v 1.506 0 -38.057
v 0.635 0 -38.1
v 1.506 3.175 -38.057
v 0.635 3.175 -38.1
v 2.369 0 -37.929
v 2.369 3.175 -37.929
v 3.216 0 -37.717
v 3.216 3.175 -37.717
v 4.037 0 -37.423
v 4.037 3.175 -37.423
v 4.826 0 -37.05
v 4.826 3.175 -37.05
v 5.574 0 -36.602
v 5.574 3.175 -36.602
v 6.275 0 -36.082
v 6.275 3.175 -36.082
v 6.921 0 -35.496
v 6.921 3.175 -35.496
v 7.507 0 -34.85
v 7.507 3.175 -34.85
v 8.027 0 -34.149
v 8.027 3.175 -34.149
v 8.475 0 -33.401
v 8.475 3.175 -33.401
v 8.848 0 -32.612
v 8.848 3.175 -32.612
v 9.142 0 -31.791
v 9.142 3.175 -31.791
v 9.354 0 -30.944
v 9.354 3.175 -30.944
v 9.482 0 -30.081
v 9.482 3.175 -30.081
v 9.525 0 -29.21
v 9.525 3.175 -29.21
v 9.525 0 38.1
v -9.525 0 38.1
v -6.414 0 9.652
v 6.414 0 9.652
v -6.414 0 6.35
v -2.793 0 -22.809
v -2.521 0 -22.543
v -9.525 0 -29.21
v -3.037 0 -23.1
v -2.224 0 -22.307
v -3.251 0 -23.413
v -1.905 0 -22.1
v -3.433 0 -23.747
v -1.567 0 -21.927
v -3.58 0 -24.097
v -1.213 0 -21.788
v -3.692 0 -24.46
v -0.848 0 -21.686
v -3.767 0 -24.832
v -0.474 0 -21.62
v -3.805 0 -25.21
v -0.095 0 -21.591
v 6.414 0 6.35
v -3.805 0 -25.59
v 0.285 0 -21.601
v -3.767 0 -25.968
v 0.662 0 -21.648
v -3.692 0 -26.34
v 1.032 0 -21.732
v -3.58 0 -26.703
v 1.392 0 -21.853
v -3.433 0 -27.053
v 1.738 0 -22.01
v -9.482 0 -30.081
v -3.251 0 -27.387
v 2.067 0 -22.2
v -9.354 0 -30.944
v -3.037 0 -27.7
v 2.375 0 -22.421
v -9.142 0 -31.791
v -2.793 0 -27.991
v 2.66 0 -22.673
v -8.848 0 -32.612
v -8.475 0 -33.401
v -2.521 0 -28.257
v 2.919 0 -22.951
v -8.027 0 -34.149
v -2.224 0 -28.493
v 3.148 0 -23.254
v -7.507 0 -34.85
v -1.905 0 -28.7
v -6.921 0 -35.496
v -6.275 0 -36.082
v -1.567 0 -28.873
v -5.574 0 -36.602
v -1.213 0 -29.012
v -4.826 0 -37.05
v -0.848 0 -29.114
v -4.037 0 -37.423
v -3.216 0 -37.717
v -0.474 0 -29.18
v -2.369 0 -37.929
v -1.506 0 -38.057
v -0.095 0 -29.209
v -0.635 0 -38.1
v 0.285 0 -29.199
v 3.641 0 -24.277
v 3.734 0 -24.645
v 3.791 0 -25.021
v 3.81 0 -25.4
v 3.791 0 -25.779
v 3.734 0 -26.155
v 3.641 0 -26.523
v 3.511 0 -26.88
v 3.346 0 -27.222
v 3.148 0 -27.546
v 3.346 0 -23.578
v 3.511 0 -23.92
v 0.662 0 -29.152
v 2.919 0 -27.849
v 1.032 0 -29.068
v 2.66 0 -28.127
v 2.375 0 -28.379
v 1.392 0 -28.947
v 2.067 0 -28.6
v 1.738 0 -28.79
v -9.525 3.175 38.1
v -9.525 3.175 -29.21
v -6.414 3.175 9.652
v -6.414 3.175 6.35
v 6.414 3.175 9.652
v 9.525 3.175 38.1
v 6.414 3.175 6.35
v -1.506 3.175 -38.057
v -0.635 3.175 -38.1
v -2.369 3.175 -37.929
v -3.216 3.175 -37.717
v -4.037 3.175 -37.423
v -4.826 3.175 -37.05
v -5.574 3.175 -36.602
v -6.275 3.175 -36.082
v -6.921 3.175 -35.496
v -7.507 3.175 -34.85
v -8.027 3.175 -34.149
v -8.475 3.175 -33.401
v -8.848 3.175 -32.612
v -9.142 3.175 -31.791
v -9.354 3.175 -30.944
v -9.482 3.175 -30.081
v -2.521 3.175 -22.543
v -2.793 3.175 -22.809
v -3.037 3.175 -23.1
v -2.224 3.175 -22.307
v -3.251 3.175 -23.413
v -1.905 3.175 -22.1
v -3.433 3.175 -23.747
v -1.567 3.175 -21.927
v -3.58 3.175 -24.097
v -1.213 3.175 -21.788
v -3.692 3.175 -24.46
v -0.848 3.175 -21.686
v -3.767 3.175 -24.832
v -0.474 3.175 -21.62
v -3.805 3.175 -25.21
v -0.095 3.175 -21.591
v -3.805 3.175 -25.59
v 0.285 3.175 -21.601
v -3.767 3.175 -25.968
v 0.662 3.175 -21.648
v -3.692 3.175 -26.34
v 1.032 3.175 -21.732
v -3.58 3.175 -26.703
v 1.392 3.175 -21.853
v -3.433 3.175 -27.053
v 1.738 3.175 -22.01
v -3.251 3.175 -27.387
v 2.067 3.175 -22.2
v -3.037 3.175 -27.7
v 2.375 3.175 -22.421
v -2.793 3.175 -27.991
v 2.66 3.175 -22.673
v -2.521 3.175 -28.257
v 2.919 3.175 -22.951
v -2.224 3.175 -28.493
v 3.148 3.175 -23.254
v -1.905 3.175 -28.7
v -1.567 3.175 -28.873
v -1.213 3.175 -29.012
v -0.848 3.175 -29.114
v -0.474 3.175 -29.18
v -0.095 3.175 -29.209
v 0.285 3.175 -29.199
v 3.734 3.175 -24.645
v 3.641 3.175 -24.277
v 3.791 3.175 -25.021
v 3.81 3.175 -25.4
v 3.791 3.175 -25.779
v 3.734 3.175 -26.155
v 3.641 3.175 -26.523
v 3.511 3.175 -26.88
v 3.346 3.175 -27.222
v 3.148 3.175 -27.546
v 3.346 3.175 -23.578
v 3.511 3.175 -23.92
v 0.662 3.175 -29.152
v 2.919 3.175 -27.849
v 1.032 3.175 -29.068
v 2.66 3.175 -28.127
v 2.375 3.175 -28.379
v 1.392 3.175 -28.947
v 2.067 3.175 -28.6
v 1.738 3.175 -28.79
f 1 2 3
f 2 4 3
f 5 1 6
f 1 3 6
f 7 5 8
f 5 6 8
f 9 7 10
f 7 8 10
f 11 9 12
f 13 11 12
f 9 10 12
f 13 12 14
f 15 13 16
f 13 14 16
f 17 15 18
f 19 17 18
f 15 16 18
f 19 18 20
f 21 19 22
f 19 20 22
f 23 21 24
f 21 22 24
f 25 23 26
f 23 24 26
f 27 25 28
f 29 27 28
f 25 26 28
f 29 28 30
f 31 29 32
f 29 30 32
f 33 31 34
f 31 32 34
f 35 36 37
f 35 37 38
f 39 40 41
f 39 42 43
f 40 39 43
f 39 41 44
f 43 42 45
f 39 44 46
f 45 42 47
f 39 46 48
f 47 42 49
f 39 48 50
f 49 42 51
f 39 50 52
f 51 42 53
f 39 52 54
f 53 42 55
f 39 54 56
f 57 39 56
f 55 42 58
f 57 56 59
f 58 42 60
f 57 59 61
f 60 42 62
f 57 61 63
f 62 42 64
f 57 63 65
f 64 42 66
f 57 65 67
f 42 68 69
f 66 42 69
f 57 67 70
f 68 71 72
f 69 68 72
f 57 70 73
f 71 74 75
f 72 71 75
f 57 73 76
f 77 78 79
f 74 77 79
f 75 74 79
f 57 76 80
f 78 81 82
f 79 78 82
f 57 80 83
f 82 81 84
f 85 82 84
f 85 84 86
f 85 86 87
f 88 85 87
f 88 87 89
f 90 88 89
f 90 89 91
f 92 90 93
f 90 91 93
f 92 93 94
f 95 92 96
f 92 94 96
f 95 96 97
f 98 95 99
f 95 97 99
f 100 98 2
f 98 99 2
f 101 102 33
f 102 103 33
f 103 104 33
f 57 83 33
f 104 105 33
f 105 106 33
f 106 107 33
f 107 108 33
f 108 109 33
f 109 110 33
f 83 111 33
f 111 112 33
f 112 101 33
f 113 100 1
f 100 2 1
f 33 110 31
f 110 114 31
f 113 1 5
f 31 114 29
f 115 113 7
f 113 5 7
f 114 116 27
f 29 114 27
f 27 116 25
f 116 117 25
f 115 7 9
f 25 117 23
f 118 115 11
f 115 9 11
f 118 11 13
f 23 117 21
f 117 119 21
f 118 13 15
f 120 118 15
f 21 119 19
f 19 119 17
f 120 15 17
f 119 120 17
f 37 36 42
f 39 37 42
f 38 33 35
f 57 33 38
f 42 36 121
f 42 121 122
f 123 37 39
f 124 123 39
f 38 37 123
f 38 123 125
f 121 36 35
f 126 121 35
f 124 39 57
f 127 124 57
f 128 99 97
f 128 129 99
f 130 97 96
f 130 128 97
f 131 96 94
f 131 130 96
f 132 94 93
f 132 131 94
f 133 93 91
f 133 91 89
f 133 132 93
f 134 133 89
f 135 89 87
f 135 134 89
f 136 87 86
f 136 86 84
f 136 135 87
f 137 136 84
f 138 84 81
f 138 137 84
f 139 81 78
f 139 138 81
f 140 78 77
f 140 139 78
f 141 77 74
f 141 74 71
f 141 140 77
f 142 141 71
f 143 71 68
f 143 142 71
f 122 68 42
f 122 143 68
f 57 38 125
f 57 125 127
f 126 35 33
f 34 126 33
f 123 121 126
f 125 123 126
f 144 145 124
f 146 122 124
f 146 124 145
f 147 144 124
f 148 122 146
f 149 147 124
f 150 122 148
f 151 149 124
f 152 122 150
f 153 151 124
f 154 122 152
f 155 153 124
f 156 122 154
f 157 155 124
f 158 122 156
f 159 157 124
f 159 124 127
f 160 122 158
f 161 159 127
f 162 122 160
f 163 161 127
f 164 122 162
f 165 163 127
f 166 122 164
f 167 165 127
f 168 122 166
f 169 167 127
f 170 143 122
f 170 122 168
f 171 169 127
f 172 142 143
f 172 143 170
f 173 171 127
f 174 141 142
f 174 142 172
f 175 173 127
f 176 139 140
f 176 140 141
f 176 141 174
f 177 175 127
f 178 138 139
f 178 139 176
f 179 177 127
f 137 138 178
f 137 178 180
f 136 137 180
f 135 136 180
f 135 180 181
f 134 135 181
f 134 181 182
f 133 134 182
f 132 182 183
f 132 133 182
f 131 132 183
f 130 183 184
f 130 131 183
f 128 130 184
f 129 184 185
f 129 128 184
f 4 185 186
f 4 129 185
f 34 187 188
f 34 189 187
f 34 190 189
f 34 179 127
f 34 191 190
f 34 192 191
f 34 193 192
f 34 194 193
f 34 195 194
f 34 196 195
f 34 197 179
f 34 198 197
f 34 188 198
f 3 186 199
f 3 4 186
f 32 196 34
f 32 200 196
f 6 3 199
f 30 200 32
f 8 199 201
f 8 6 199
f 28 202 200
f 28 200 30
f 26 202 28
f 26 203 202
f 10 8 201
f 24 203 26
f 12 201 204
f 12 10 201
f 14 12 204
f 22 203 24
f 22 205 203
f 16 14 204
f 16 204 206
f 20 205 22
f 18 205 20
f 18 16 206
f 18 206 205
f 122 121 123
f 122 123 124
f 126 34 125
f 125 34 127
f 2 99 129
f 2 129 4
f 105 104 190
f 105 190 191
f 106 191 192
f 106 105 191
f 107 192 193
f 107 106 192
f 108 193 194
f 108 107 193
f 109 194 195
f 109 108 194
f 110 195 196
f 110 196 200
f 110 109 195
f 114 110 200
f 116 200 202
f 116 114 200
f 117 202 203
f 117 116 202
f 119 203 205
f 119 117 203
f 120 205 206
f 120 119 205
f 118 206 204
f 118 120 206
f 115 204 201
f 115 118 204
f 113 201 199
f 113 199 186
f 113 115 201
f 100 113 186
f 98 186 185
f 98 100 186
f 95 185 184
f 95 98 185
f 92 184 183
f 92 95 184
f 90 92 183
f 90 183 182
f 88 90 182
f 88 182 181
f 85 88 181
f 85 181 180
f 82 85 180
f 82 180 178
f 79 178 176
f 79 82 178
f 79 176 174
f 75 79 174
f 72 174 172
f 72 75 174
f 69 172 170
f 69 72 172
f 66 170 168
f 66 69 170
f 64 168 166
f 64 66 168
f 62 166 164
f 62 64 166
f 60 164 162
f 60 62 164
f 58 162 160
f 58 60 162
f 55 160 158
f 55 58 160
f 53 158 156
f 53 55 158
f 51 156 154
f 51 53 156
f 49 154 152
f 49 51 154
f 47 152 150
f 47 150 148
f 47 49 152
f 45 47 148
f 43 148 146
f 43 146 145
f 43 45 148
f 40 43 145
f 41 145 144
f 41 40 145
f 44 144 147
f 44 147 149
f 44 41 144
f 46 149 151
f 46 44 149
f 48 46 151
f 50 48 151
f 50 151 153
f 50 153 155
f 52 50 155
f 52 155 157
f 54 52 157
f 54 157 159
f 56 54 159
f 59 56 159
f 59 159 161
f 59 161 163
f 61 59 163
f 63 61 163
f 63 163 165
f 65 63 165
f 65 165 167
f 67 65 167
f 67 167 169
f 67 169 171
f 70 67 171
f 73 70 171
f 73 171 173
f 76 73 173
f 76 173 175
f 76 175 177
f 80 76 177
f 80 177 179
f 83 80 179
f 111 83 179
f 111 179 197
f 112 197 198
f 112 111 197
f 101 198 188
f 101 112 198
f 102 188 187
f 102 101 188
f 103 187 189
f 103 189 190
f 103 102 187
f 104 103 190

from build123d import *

# Parameters (mm, degrees)
SKETCH1_W           = 19.05
SKETCH1_H           = 76.2
SKETCH1_R           = 3.81
SKETCH1_W_2         = 12.827
SKETCH1_H_2         = 3.302
BOSS_EXTRUDE1_DEPTH = 3.175
FILLET1_R           = 8.89
FILLET2_R           = 8.89


with BuildPart() as part:
    # Sketch1 → Boss-Extrude1 (new body)
    with BuildSketch(Plane(origin=(0, 0, 0), x_dir=(1, 0, 0), z_dir=(0, 1, 0))):
        Rectangle(SKETCH1_W, SKETCH1_H)
        with Locations((0, 25.4)):
            Circle(SKETCH1_R, mode=Mode.SUBTRACT)
        with Locations((0, -8.001)):
            Rectangle(SKETCH1_W_2, SKETCH1_H_2, mode=Mode.SUBTRACT)
    extrude(amount=BOSS_EXTRUDE1_DEPTH)

    # Fillet1
    fillet1_edges = [part.edges().sort_by_distance(p)[0] for p in [
        (9.525, 1.5875, -38.1),
    ]]
    fillet(fillet1_edges, radius=FILLET1_R)

    # Fillet2
    fillet2_edges = [part.edges().sort_by_distance(p)[0] for p in [
        (-9.525, 1.5875, -38.1),
    ]]
    fillet(fillet2_edges, radius=FILLET2_R)


solid = part.part
